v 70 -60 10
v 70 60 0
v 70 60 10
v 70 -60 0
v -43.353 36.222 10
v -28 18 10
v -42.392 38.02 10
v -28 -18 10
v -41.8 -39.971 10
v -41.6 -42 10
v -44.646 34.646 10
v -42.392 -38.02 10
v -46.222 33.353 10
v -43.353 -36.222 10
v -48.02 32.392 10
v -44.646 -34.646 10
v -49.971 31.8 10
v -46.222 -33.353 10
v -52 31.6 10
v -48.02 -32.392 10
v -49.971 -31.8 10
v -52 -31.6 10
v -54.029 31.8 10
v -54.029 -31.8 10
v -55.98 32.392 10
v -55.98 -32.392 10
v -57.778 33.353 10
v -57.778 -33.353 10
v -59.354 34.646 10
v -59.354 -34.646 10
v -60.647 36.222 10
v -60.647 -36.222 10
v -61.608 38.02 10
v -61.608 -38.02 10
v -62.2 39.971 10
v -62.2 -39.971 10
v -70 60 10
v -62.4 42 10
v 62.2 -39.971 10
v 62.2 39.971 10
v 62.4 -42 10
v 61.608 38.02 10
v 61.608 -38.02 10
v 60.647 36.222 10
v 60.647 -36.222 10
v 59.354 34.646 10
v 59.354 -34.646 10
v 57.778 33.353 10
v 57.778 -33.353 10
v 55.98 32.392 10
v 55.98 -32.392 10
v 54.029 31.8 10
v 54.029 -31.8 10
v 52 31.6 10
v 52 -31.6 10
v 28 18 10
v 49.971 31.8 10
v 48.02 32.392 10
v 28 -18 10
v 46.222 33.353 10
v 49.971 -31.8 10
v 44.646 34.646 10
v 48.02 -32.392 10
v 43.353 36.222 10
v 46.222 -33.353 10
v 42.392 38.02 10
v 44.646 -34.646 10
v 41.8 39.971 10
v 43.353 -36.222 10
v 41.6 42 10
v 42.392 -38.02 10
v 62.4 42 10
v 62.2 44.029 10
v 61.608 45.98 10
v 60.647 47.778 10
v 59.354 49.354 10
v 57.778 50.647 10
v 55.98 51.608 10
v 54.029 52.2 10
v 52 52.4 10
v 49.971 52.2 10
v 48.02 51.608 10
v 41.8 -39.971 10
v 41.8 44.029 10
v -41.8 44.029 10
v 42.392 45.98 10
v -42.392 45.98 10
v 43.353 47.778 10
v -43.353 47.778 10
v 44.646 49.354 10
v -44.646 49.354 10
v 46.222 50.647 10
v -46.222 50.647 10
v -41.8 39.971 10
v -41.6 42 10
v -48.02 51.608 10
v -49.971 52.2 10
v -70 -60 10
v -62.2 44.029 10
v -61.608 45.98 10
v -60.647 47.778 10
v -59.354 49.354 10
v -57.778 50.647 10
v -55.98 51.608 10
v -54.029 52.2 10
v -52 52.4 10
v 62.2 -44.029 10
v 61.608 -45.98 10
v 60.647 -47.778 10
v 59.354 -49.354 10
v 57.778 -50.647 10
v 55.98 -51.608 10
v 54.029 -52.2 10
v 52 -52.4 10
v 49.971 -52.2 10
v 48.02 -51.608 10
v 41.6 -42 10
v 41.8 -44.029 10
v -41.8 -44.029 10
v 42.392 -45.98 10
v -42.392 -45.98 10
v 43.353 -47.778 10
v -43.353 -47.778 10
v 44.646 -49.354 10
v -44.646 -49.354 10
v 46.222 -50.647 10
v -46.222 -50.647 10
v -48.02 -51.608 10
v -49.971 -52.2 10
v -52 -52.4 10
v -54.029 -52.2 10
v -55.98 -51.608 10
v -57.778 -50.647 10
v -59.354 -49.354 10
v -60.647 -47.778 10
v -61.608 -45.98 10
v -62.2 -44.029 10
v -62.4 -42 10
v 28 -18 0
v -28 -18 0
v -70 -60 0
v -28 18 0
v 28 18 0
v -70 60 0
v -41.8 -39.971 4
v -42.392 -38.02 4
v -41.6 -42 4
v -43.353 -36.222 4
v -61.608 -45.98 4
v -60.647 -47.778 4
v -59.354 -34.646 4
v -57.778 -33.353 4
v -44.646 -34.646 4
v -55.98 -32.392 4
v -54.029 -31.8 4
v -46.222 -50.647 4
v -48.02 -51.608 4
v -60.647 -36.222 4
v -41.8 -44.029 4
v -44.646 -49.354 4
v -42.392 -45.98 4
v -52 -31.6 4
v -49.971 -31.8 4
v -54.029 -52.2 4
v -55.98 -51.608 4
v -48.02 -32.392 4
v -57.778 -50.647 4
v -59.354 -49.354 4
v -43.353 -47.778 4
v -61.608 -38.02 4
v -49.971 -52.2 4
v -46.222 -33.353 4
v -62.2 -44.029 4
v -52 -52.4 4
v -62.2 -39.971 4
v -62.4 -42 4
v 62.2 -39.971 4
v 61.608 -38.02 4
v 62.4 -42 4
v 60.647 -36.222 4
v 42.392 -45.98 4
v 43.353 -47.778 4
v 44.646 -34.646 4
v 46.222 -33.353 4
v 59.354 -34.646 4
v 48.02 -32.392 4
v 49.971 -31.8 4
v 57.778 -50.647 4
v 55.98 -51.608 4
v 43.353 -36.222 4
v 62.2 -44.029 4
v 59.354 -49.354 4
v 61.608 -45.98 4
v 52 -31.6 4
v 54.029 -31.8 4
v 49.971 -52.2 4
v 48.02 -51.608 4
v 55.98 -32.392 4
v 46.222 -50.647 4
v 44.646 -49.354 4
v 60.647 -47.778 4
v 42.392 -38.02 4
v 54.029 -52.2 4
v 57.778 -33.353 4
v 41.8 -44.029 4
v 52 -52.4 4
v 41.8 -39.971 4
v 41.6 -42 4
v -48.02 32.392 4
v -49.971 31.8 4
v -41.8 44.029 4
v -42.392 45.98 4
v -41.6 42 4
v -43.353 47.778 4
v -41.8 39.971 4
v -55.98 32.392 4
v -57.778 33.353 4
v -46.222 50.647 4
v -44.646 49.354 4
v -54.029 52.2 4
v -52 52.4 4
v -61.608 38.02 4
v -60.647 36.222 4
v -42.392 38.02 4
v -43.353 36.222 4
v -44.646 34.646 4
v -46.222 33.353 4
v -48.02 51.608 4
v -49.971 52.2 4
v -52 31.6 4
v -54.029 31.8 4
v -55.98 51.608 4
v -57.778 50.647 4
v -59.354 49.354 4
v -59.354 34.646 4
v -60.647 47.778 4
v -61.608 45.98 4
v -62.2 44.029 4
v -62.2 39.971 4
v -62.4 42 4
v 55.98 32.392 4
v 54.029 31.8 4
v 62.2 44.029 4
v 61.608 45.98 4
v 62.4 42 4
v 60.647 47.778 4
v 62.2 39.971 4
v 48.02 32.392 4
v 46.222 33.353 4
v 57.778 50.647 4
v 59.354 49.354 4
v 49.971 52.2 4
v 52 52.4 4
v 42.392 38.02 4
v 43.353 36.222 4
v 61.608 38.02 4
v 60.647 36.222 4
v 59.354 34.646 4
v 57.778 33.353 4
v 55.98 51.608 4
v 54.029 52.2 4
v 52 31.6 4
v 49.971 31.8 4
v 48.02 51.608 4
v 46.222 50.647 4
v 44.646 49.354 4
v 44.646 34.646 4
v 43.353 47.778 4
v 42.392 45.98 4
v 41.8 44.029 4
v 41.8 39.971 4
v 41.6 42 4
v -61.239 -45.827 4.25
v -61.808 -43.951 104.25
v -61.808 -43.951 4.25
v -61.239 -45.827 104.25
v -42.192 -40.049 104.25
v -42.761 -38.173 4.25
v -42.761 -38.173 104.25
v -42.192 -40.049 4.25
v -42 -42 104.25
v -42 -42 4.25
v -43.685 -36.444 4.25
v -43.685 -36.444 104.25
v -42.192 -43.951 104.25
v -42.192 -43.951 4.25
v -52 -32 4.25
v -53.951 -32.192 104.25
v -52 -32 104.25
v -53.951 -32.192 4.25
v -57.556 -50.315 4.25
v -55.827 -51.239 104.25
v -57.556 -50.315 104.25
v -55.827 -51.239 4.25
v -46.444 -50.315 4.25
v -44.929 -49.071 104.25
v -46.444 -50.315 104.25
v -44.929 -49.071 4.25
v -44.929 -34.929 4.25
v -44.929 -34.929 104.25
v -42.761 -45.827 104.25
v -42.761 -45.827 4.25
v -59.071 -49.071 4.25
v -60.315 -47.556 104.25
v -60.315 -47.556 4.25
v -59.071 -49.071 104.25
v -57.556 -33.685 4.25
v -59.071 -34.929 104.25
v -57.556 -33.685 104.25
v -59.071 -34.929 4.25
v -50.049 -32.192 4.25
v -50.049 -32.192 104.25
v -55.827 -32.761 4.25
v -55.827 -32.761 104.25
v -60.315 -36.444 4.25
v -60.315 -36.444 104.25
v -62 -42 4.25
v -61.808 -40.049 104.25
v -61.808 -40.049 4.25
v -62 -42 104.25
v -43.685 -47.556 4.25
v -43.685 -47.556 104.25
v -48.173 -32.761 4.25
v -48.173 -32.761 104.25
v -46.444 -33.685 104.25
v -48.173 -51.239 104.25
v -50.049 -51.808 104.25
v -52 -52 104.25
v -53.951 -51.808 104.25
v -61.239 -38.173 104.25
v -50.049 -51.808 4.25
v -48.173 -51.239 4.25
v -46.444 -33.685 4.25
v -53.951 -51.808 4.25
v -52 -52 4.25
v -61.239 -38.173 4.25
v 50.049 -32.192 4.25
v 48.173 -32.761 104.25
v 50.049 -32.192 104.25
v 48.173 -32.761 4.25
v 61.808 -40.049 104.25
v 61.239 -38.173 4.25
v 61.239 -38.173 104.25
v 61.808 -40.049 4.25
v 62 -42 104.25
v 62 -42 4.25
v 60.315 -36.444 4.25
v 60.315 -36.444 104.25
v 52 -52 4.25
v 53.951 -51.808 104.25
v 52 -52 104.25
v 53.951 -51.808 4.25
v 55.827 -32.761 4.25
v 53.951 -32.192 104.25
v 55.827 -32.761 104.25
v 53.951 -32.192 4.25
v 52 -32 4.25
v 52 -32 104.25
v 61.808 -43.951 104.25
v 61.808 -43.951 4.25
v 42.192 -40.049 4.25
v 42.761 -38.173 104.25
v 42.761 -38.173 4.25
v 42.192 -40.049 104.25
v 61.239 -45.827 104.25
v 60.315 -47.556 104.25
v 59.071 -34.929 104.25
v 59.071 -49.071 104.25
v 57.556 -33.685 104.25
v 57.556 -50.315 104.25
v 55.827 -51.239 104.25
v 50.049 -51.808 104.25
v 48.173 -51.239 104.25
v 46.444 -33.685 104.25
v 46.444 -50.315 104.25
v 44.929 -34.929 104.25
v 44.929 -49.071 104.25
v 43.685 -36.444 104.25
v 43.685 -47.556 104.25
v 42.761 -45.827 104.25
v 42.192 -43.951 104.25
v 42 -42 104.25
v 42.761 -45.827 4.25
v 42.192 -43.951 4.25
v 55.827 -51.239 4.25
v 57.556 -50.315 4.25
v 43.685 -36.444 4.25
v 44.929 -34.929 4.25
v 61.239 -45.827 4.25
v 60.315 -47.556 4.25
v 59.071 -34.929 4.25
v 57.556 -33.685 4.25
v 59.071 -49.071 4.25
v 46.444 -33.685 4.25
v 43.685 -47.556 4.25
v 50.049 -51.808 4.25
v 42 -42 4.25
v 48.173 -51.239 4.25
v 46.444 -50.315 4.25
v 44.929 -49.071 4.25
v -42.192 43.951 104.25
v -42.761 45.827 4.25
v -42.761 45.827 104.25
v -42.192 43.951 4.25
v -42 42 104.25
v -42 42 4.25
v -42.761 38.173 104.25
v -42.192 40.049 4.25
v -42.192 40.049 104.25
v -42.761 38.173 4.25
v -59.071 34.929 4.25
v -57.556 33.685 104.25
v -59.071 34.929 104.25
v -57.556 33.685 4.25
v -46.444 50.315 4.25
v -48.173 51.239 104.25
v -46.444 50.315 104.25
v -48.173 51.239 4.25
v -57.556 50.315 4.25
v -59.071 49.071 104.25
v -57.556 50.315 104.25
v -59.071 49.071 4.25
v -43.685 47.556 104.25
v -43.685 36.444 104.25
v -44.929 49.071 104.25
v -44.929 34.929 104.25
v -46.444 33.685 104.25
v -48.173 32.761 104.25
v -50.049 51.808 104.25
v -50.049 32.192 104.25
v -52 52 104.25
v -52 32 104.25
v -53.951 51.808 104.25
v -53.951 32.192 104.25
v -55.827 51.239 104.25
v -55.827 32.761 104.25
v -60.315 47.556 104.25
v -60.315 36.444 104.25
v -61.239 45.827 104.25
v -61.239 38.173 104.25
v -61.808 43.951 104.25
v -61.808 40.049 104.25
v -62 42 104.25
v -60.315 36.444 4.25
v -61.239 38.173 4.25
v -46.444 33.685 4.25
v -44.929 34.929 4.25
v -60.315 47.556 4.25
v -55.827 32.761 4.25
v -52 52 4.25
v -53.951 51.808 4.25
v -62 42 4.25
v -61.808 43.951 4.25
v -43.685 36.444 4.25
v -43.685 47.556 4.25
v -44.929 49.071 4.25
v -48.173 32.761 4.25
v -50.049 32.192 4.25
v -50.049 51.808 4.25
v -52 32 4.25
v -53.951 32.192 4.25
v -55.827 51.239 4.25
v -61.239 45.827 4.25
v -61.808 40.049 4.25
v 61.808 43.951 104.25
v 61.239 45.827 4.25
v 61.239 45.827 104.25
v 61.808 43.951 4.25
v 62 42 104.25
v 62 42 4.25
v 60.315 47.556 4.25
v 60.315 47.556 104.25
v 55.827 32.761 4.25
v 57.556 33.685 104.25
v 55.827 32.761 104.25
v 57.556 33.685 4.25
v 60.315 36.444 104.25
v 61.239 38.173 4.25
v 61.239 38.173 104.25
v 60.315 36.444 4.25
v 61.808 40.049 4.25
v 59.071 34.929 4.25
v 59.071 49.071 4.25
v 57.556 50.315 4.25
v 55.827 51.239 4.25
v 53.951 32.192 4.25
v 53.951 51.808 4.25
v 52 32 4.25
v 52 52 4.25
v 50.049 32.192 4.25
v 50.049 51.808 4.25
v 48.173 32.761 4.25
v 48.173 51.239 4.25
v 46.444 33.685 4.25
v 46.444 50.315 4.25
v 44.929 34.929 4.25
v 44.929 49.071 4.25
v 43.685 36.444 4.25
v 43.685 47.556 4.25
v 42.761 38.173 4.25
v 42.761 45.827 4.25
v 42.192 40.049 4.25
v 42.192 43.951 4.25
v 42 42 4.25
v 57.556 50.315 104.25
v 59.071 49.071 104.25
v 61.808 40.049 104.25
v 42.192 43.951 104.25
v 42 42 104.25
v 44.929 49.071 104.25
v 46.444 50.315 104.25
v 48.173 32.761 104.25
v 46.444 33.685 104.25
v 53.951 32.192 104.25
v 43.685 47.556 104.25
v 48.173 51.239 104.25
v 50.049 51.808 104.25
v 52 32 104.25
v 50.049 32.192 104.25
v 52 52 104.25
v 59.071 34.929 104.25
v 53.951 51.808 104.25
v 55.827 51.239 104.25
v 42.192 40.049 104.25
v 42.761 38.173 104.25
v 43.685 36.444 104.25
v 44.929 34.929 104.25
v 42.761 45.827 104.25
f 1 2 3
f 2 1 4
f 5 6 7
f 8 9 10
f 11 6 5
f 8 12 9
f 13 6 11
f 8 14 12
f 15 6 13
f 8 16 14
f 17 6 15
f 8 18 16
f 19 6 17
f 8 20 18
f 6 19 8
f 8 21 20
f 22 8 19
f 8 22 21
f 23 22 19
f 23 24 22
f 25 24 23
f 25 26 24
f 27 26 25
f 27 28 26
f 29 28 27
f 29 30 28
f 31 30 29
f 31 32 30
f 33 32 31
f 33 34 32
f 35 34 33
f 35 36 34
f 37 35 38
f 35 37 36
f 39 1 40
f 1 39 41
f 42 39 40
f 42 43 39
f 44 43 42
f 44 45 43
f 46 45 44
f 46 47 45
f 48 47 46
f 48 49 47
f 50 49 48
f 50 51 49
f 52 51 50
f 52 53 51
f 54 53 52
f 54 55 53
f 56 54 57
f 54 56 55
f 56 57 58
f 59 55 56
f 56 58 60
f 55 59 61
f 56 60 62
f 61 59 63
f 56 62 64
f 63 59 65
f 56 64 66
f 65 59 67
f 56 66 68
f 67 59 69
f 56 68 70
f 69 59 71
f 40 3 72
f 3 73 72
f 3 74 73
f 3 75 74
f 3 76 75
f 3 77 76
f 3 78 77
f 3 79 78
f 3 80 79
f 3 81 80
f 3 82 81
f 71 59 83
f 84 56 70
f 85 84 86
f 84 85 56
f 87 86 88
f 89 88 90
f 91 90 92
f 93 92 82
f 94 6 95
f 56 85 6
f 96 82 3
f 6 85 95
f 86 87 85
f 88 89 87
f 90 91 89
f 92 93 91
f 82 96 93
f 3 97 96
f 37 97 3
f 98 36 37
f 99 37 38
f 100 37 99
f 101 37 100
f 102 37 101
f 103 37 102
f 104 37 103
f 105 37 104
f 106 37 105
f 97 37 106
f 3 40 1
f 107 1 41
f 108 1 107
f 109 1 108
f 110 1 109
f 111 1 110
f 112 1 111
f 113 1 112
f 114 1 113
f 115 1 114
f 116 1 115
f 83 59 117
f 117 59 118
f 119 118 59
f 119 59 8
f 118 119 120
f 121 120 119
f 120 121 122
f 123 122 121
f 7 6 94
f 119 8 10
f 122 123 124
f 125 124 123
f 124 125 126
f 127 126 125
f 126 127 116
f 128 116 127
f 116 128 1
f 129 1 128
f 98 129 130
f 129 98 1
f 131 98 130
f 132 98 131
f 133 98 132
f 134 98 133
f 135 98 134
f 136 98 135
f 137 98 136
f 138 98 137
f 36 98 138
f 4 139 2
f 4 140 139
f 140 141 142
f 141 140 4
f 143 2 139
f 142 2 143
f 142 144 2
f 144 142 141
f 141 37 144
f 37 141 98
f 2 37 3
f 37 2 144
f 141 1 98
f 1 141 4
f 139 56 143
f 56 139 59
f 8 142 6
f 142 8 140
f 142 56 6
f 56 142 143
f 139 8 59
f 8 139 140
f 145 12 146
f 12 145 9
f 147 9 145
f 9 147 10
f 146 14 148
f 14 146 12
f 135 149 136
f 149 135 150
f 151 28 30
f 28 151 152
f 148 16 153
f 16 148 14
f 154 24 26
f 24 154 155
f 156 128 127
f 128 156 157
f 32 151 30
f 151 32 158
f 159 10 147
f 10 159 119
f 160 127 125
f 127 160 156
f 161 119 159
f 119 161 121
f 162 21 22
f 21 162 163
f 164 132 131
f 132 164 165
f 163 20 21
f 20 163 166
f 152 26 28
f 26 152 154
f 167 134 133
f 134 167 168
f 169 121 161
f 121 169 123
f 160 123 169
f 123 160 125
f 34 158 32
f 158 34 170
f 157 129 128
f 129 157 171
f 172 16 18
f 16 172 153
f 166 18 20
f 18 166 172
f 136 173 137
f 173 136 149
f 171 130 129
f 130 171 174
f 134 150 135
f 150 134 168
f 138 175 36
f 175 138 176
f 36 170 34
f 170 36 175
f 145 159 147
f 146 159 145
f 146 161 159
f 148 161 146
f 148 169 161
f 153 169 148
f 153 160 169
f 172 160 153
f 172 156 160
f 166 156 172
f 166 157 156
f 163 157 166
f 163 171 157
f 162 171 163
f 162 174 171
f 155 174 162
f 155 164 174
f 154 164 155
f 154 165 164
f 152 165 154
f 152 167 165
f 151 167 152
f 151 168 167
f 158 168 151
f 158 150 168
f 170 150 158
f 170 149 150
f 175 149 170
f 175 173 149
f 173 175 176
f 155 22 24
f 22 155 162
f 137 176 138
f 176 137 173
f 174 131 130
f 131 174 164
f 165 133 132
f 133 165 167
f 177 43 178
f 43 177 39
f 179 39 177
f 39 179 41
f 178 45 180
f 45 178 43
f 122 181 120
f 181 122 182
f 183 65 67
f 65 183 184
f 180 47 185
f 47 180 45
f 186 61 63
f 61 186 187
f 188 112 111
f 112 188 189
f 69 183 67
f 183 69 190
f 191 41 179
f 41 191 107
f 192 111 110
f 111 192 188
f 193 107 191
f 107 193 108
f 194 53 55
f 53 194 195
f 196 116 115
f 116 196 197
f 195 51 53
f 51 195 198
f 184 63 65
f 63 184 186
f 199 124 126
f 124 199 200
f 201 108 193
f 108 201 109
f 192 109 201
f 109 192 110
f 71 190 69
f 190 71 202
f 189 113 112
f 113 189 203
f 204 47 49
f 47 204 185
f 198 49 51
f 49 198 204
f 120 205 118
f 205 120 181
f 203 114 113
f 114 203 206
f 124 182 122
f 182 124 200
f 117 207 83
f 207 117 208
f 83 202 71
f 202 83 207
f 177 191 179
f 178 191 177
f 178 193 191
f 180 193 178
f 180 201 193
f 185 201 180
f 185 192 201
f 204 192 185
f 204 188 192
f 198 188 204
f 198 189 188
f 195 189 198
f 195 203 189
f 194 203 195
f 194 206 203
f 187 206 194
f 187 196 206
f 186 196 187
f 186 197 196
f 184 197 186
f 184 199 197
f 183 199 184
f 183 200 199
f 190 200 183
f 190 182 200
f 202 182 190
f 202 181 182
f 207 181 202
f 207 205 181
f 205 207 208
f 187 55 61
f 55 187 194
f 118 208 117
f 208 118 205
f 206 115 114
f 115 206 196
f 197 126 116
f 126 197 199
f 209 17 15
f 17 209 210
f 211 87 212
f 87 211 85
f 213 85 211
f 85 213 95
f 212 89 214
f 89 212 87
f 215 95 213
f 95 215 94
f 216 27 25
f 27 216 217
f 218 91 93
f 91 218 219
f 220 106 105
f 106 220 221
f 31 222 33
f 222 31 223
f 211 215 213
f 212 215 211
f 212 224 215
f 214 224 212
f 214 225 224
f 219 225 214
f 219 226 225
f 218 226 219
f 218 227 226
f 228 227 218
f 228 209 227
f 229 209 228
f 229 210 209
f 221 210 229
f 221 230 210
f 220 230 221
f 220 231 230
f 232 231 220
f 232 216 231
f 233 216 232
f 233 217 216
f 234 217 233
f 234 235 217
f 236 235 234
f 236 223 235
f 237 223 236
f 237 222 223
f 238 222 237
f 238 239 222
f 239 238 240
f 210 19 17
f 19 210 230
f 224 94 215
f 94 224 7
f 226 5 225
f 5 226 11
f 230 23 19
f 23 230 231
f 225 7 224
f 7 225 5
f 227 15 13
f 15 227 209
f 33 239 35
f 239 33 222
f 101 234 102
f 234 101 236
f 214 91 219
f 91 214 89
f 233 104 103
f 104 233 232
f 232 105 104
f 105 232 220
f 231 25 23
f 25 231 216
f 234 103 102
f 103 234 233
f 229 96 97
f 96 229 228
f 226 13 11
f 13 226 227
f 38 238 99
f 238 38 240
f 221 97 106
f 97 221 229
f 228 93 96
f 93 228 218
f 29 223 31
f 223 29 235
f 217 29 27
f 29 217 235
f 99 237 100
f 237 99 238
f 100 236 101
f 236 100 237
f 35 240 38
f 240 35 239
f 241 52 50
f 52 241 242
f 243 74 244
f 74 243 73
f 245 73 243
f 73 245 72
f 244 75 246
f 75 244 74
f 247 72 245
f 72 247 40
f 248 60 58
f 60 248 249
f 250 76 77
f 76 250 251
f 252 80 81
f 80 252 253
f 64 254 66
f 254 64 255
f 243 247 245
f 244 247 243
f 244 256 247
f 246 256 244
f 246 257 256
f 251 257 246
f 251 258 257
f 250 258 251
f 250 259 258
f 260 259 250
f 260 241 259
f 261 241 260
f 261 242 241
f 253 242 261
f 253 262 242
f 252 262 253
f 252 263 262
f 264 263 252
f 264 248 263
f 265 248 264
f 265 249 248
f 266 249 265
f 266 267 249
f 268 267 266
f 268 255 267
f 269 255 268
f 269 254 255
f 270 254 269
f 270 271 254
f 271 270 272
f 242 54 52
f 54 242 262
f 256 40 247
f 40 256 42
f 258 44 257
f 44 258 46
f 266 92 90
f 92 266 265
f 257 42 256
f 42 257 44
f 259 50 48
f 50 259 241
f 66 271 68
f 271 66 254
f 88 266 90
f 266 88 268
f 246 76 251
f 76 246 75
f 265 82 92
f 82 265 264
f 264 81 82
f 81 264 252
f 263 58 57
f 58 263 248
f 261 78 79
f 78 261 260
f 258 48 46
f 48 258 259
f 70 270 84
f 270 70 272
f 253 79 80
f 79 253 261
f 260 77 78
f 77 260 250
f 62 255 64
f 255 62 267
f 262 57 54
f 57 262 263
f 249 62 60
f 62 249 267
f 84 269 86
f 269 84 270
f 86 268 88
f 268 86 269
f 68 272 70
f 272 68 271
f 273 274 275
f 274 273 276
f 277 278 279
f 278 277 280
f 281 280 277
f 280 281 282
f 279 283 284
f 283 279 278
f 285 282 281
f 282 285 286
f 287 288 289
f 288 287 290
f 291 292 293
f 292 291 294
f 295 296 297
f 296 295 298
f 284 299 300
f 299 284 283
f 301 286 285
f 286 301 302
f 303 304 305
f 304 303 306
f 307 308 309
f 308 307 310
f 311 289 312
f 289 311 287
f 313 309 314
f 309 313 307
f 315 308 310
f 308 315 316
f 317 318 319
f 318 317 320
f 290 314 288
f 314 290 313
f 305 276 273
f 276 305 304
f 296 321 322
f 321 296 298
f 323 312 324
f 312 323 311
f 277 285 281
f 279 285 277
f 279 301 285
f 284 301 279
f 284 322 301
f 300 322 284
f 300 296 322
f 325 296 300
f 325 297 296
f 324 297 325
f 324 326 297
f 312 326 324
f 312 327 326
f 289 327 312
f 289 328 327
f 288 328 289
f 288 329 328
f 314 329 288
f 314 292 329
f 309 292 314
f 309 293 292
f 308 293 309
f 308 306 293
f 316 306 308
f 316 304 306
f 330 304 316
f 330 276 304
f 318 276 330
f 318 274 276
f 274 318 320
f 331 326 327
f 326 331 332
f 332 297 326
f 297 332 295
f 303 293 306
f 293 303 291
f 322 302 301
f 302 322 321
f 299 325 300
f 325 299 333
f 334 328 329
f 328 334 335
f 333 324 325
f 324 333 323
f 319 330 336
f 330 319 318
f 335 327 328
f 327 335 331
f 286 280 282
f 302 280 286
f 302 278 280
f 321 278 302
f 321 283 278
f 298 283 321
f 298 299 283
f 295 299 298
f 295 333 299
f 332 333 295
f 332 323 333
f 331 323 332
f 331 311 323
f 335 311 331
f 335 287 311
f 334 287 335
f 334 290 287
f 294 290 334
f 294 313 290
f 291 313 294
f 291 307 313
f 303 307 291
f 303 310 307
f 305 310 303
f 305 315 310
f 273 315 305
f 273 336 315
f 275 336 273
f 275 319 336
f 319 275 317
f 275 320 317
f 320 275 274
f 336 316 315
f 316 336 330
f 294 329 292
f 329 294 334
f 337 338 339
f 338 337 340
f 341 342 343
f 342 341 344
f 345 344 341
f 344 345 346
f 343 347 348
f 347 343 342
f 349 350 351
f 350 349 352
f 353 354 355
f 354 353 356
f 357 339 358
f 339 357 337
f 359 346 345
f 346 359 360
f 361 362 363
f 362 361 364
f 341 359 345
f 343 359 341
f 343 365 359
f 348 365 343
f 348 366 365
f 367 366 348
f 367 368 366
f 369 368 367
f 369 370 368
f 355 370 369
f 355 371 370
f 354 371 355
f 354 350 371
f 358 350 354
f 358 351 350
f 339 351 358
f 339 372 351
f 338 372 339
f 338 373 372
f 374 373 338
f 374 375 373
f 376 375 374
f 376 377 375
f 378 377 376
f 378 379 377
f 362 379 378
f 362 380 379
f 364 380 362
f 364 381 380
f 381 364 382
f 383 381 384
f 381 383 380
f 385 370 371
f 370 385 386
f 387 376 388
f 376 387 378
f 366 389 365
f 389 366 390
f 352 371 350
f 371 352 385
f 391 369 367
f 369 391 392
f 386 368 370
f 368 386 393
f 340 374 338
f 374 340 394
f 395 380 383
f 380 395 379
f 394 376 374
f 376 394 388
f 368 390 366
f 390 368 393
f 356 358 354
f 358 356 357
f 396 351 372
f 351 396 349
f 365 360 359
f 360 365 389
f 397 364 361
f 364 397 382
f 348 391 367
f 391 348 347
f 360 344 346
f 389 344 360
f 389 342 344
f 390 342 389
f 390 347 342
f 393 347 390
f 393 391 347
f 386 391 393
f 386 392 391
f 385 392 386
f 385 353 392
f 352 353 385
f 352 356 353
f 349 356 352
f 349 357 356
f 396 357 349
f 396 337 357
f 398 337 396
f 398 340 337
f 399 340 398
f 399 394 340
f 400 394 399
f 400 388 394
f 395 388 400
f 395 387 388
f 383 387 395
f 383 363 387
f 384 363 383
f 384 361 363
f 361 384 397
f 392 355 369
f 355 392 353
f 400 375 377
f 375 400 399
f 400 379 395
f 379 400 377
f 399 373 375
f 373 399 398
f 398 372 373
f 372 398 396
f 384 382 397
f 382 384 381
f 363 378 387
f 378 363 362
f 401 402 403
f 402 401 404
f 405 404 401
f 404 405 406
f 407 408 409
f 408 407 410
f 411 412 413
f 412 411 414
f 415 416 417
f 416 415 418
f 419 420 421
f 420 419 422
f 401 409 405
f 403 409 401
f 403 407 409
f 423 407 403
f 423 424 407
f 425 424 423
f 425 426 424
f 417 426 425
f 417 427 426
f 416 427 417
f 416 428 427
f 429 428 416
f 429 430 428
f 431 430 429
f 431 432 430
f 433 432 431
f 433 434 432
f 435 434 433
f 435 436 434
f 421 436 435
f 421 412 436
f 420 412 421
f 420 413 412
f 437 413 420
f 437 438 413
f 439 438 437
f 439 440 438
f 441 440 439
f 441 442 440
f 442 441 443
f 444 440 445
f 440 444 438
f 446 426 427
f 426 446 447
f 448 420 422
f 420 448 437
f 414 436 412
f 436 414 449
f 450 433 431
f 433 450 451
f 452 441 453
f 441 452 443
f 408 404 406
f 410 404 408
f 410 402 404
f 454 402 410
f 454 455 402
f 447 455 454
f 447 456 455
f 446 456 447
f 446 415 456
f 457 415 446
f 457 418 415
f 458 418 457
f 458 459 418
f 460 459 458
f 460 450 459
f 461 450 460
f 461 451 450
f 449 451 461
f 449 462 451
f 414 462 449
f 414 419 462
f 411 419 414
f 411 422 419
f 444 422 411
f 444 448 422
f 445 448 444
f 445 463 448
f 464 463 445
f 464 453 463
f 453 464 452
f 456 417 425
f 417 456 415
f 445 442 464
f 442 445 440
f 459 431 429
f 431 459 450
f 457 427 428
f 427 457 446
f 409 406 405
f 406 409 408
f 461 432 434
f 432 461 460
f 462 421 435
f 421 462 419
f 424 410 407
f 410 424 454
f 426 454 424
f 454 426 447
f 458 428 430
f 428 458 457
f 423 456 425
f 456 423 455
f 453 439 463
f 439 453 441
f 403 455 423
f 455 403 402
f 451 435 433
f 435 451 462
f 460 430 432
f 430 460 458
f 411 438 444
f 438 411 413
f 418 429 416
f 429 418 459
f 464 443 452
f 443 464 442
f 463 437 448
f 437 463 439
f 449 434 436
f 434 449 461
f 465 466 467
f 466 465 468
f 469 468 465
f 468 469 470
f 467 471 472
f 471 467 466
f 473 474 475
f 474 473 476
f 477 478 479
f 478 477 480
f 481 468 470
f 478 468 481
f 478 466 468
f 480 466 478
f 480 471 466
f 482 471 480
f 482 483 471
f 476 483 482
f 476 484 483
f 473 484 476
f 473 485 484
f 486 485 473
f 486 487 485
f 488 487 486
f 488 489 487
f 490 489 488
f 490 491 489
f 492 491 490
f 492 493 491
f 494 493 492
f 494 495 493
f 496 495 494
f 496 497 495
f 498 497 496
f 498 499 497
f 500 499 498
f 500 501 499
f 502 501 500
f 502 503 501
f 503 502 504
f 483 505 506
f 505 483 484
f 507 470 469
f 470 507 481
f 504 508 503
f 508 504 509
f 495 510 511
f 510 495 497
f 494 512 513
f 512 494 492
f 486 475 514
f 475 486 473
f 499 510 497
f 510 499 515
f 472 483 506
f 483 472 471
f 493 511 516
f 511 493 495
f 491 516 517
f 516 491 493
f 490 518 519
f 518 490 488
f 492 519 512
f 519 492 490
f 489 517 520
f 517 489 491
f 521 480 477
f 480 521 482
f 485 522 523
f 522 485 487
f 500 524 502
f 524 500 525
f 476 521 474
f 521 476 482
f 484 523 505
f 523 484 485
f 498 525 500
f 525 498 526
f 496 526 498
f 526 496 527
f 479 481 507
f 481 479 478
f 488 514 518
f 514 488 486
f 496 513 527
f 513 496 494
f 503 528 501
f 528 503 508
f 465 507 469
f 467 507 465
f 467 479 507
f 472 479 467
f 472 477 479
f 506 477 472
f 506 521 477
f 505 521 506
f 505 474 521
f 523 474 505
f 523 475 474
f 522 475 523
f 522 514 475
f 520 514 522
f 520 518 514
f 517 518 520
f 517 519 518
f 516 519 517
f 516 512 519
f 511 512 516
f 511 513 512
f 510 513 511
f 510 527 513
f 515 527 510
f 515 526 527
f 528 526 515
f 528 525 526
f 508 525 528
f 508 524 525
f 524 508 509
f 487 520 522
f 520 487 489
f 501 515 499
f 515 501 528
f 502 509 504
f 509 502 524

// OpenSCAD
$fn = 32;

// ------------------------------------------------------------------------
// Frame with four posts: 140 x 120 mm frame, four d20 posts
// Every part is its own module, assembly() places them once.
// ------------------------------------------------------------------------

// --- part 1 ---
module base_frame() {
  difference() {
    translate([-70, -60, 0]) cube([140, 120, 10]);
    translate([-28, -18, -1]) cube([56, 36, 12]);
    translate([-52, -42, 4]) cylinder(h = 7, d = 20.8);
    translate([52, -42, 4]) cylinder(h = 7, d = 20.8);
    translate([-52, 42, 4]) cylinder(h = 7, d = 20.8);
    translate([52, 42, 4]) cylinder(h = 7, d = 20.8);
  }
}

// --- part 2 ---
module post1() {
  cylinder(h = 100, d = 20);
}

// --- part 3 ---
module post2() {
  cylinder(h = 100, d = 20);
}

// --- part 4 ---
module post3() {
  cylinder(h = 100, d = 20);
}

// --- part 5 ---
module post4() {
  cylinder(h = 100, d = 20);
}

// --- assembly ---
module assembly() {
  translate([0, 0, 0]) rotate([0, 0, 0]) base_frame();
  translate([-52, -42, 4.25]) rotate([0, 0, 0]) post1();
  translate([52, -42, 4.25]) rotate([0, 0, 0]) post2();
  translate([-52, 42, 4.25]) rotate([0, 0, 0]) post3();
  translate([52, 42, 4.25]) rotate([0, 0, 0]) post4();
}

assembly();
